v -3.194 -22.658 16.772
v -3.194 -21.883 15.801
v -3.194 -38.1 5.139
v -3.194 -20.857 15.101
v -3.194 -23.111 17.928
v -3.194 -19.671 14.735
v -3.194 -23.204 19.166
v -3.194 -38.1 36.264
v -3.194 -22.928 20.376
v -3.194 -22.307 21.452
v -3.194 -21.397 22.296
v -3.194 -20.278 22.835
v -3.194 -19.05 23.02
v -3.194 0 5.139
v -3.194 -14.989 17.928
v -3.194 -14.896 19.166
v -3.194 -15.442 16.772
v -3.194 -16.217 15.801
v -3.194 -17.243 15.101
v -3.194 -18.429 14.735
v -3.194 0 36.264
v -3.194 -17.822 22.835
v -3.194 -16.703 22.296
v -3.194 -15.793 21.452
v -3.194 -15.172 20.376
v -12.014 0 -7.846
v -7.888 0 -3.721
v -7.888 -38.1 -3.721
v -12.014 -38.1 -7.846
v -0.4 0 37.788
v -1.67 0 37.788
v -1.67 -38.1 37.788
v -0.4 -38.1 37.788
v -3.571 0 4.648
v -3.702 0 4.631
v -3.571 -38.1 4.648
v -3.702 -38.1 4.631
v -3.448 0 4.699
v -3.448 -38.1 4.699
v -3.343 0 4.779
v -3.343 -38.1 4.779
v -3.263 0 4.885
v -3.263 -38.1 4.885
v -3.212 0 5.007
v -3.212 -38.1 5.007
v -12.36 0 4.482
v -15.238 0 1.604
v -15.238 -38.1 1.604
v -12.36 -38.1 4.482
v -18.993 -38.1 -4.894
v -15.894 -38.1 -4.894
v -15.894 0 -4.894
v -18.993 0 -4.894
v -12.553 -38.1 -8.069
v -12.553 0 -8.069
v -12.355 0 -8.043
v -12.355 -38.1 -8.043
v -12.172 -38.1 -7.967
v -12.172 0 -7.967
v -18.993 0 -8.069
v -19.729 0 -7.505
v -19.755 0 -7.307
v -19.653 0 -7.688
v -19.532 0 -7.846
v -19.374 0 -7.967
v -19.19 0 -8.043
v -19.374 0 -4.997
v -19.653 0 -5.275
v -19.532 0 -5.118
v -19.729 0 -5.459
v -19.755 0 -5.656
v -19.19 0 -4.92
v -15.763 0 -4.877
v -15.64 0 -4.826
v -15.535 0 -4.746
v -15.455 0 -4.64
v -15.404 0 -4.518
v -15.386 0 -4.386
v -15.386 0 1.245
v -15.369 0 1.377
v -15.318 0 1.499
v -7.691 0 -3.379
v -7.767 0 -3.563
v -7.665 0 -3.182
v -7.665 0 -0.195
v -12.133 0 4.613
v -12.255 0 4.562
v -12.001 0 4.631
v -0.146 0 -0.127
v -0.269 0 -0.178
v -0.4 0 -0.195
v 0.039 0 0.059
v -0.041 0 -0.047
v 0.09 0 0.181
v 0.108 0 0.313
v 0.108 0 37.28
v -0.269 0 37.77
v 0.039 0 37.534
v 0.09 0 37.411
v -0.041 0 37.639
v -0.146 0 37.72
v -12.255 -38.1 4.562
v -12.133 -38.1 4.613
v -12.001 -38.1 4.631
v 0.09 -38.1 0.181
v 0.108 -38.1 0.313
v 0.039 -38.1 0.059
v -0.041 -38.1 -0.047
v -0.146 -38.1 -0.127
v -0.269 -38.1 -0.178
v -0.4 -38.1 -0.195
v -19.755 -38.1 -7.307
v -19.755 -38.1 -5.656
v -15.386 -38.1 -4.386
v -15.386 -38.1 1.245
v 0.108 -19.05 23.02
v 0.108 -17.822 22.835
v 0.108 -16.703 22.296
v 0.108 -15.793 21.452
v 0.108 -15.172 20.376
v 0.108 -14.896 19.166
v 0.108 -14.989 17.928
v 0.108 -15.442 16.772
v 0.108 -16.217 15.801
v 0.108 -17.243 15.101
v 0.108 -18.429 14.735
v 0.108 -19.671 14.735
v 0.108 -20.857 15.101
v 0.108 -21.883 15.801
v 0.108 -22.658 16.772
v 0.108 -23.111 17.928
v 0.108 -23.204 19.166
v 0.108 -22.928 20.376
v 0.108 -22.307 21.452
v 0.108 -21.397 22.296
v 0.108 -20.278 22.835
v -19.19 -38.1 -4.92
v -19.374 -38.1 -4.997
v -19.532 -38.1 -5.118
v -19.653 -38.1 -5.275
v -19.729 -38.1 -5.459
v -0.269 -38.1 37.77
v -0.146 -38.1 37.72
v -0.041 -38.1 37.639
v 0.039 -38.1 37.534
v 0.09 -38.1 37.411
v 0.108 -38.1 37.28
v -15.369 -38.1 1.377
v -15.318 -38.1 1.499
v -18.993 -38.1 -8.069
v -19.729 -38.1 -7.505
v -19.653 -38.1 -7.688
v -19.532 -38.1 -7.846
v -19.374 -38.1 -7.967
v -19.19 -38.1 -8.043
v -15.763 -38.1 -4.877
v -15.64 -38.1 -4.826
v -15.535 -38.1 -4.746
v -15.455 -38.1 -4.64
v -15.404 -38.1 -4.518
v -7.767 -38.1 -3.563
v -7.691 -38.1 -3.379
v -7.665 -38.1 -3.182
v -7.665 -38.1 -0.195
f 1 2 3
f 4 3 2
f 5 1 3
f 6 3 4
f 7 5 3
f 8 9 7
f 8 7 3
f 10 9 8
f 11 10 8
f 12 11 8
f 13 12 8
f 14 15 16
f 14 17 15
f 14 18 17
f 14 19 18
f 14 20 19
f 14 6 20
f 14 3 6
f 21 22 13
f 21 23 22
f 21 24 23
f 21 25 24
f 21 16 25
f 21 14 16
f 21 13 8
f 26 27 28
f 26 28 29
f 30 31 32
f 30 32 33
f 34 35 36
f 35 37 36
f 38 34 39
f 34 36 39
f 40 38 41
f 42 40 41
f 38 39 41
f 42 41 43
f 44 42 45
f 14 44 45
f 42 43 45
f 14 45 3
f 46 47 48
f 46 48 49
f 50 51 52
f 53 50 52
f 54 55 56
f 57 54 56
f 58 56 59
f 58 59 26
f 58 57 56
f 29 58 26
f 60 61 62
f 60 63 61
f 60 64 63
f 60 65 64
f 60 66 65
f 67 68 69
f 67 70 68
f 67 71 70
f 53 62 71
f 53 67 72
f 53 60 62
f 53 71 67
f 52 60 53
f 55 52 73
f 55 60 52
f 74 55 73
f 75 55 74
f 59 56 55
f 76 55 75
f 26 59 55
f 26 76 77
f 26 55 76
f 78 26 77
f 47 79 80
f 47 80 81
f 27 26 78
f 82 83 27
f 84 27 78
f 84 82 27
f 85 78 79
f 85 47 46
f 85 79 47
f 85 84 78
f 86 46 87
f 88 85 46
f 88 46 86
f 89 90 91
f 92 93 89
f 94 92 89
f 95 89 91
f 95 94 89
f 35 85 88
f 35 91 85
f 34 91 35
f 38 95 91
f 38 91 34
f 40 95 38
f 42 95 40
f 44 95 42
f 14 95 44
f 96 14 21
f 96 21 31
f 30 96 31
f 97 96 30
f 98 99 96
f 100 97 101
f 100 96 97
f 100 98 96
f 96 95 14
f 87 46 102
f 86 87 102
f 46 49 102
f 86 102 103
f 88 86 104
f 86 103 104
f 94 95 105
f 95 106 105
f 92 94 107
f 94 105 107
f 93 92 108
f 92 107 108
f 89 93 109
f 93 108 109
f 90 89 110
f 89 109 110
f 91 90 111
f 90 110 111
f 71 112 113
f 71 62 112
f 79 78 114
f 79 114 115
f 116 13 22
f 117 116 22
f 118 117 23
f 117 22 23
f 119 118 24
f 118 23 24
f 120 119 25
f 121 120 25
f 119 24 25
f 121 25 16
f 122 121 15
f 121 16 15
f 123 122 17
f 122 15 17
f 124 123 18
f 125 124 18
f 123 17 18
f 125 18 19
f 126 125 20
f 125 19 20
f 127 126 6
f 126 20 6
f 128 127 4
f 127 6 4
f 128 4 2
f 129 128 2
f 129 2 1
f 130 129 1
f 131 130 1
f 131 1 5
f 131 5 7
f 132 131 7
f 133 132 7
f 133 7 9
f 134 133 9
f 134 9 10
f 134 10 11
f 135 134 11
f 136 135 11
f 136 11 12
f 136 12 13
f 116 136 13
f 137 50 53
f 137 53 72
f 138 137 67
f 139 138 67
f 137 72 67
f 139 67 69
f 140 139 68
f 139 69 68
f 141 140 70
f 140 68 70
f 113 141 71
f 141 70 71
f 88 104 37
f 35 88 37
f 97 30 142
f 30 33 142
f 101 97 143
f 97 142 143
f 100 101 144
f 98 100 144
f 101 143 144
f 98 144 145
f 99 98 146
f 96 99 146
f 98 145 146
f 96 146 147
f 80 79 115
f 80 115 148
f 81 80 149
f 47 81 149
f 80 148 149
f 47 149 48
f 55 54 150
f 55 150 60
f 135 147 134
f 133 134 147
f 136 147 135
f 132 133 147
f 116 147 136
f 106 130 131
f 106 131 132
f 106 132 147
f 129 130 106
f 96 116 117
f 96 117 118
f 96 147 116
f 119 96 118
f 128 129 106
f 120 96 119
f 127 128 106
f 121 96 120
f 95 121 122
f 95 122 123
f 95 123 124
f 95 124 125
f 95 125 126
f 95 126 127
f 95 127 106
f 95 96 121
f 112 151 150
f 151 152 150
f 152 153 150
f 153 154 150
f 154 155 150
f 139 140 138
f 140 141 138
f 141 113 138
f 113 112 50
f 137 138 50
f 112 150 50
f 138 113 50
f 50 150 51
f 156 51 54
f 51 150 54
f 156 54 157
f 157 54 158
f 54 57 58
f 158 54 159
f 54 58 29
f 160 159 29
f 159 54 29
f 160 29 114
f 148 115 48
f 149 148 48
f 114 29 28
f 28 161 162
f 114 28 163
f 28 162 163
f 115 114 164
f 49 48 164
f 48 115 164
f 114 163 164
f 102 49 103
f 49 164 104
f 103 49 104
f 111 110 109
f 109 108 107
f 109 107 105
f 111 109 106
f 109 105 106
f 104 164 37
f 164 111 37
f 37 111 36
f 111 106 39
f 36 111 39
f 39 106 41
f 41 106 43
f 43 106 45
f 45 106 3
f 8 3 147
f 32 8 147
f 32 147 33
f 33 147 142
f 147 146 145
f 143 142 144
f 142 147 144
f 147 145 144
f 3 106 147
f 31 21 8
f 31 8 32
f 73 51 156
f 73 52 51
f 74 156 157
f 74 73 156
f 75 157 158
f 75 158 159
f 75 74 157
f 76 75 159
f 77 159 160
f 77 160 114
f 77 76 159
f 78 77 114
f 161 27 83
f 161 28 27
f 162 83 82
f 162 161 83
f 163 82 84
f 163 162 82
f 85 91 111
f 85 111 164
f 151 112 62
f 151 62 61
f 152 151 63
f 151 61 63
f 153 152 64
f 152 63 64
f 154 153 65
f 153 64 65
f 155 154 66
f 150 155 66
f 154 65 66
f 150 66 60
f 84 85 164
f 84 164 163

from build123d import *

# Parameters (mm, degrees)
BOSS_EXTRUDE1_DEPTH = 38.1
SKETCH2_W           = 3.175
SKETCH2_H           = 38.1
BOSS_EXTRUDE2_DEPTH = 4.3688
HOLE1_D             = 8.3312
HOLE1_DEPTH         = 19.862825
FILLET1_R           = 0.508
FILLET2_R           = 0.762


with BuildPart() as part:
    # Sketch1 → Boss-Extrude1 (new body)
    with BuildSketch(Plane(origin=(0, 0, 0), x_dir=(1, 0, 0), z_dir=(0, 1, 0))):
        Polygon((-12.236871502, 8.069451482), (-15.386471502, 8.069451482), (-15.386471502, -1.455548518), (-12.211471502, -4.630548518), (-3.194471502, -4.630548518), (-3.194471502, -36.263708518), (-1.670471502, -37.787708518), (0.107528498, -37.787708518), (0.107528498, 0.195451482), (-7.664871502, 0.195451482), (-7.664871502, 3.497451482), align=None)
    extrude(amount=-BOSS_EXTRUDE1_DEPTH)

    # Sketch2 → Boss-Extrude2 (add)
    with BuildSketch(Plane.ZY.offset(15.386471502)):
        with Locations((-6.481951482, -19.05)):
            Rectangle(SKETCH2_W, SKETCH2_H)
    extrude(amount=BOSS_EXTRUDE2_DEPTH)

    # Hole1
    with Locations(Plane(origin=(0.107528498, 0, 0), x_dir=(0, 0, -1), z_dir=(1, 0, 0))):
        with Locations((-18.854548518, -19.05)):
            Hole(HOLE1_D / 2, depth=HOLE1_DEPTH)

    # Fillet1
    fillet1_edges = [part.edges().sort_by_distance(p)[0] for p in [
        (-15.386471502, -19.05, -4.894451482),
        (0.107528498, -19.05, -0.195451482),
        (0.107528498, -19.05, 37.787708518),
        (-12.211471502, -19.05, 4.630548518),
        (-3.194471502, -19.05, 4.630548518),
        (-15.386471502, -19.05, 1.455548518),
    ]]
    fillet(fillet1_edges, radius=FILLET1_R)

    # Fillet2
    fillet2_edges = [part.edges().sort_by_distance(p)[0] for p in [
        (-7.664871502, -19.05, -3.497451482),
        (-19.755271502, -19.05, -4.894451482),
        (-19.755271502, -19.05, -8.069451482),
        (-12.236871502, -19.05, -8.069451482),
    ]]
    fillet(fillet2_edges, radius=FILLET2_R)


solid = part.part
